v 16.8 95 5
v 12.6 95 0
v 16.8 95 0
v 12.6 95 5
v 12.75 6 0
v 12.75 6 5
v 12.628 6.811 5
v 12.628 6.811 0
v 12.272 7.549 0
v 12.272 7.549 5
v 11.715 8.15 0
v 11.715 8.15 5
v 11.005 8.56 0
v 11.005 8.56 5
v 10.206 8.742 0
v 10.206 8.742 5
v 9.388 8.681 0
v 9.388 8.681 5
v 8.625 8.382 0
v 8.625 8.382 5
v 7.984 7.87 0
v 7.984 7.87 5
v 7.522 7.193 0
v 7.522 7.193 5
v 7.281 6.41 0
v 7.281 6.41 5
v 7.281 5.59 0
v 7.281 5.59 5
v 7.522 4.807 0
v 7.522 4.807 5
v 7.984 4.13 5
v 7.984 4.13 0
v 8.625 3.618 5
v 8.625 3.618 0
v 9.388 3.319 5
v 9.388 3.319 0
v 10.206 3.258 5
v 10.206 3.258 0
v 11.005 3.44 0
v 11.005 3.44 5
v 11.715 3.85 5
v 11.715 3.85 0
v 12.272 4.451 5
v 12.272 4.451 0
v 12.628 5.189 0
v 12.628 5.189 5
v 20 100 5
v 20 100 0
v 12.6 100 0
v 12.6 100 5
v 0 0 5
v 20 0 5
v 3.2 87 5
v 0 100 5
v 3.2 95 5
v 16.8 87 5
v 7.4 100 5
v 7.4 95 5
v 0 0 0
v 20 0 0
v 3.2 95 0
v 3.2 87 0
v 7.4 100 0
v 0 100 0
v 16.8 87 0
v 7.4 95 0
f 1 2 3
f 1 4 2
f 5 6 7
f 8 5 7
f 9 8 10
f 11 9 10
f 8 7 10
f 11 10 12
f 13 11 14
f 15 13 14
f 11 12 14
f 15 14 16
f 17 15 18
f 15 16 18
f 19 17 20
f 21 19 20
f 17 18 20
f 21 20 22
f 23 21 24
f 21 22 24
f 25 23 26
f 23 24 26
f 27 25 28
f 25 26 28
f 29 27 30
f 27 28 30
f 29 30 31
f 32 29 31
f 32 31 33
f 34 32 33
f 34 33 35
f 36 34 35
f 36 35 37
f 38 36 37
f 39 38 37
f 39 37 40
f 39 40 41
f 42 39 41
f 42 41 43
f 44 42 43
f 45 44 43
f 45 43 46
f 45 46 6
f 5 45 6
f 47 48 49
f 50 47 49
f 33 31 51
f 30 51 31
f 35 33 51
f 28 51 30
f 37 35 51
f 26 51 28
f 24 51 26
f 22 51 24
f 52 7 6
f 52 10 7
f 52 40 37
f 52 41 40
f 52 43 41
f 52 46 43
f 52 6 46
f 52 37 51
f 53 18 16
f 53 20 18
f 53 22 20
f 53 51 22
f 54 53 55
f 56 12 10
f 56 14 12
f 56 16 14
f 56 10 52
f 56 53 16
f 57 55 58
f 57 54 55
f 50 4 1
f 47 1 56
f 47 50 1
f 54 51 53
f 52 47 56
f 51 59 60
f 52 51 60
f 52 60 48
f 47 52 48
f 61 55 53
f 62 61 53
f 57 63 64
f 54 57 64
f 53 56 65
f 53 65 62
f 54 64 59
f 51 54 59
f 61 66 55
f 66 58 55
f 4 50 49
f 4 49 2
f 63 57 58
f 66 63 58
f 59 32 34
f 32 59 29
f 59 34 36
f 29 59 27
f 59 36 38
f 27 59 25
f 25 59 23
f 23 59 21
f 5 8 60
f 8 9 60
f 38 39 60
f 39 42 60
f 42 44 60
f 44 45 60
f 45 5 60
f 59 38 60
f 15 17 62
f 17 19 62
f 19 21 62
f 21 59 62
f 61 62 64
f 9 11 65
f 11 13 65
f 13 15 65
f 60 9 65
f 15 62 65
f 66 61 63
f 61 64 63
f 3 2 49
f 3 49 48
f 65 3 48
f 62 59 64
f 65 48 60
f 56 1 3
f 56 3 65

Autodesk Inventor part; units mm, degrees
ref_plane "YZ Plane" through (0, 0, 0) normal (1, 0, 0) x (0, 1, 0)
ref_plane "XZ Plane" through (0, 0, 0) normal (0, 1, 0) x (-1, 0, 0)
ref_plane "XY Plane" through (0, 0, 0) normal (0, 0, 1) x (1, 0, 0)
sketch "Sketch1" plane through (0, 0, 0) normal (0, 0, 1) x (1, 0, 0)
  line L0 (0, 0) -> (20, 0)
  line L1 (20, 0) -> (20, 100)
  line L2 (20, 100) -> (0, 100)
  line L3 (0, 100) -> (0, 0)
  dimension "d0" = 20
  dimension "d1" = 100
extrude "Extrusion1" add sketch "Sketch1" along normal blind 5
sketch "Sketch2" plane through (0, 0, 5) normal (0, 0, 1) x (1, 0, 0)
  line L0 (20, 100) -> (0, 100) projected
  line L1 (7.4, 100) -> (7.4, 95)
  line L2 (7.4, 95) -> (3.2, 95)
  line L3 (3.2, 95) -> (3.2, 87)
  line L4 (3.2, 87) -> (10, 87)
  line L5 (10, 87) -> (10, 204.0933)
  line L6 (7.4, 100) -> (10, 100)
  line L7 (20, 0) -> (20, 100) projected
  line L8 (0, 100) -> (20, 100)
  line L9 (12.6, 100) -> (12.6, 95)
  line L10 (12.6, 95) -> (16.8, 95)
  line L11 (16.8, 95) -> (16.8, 87)
  line L12 (16.8, 87) -> (10, 87)
  line L13 (12.6, 100) -> (10, 100)
  circle A0 centre (10, 6) radius 2.75
  line L14 (0, 0) -> (20, 0) projected
  dimension "d4" = 2.6
  dimension "d5" = 8
  dimension "d6" = 5
  dimension "d7" = 10
  dimension "d8" = 4.2
  dimension "d11" = 5.5
  dimension "d12" = 10
  dimension "d13" = 6
extrude "Extrusion2" cut sketch "Sketch2" against normal blind 5
properties part number "Leg1" material "Wood (Birch)"
